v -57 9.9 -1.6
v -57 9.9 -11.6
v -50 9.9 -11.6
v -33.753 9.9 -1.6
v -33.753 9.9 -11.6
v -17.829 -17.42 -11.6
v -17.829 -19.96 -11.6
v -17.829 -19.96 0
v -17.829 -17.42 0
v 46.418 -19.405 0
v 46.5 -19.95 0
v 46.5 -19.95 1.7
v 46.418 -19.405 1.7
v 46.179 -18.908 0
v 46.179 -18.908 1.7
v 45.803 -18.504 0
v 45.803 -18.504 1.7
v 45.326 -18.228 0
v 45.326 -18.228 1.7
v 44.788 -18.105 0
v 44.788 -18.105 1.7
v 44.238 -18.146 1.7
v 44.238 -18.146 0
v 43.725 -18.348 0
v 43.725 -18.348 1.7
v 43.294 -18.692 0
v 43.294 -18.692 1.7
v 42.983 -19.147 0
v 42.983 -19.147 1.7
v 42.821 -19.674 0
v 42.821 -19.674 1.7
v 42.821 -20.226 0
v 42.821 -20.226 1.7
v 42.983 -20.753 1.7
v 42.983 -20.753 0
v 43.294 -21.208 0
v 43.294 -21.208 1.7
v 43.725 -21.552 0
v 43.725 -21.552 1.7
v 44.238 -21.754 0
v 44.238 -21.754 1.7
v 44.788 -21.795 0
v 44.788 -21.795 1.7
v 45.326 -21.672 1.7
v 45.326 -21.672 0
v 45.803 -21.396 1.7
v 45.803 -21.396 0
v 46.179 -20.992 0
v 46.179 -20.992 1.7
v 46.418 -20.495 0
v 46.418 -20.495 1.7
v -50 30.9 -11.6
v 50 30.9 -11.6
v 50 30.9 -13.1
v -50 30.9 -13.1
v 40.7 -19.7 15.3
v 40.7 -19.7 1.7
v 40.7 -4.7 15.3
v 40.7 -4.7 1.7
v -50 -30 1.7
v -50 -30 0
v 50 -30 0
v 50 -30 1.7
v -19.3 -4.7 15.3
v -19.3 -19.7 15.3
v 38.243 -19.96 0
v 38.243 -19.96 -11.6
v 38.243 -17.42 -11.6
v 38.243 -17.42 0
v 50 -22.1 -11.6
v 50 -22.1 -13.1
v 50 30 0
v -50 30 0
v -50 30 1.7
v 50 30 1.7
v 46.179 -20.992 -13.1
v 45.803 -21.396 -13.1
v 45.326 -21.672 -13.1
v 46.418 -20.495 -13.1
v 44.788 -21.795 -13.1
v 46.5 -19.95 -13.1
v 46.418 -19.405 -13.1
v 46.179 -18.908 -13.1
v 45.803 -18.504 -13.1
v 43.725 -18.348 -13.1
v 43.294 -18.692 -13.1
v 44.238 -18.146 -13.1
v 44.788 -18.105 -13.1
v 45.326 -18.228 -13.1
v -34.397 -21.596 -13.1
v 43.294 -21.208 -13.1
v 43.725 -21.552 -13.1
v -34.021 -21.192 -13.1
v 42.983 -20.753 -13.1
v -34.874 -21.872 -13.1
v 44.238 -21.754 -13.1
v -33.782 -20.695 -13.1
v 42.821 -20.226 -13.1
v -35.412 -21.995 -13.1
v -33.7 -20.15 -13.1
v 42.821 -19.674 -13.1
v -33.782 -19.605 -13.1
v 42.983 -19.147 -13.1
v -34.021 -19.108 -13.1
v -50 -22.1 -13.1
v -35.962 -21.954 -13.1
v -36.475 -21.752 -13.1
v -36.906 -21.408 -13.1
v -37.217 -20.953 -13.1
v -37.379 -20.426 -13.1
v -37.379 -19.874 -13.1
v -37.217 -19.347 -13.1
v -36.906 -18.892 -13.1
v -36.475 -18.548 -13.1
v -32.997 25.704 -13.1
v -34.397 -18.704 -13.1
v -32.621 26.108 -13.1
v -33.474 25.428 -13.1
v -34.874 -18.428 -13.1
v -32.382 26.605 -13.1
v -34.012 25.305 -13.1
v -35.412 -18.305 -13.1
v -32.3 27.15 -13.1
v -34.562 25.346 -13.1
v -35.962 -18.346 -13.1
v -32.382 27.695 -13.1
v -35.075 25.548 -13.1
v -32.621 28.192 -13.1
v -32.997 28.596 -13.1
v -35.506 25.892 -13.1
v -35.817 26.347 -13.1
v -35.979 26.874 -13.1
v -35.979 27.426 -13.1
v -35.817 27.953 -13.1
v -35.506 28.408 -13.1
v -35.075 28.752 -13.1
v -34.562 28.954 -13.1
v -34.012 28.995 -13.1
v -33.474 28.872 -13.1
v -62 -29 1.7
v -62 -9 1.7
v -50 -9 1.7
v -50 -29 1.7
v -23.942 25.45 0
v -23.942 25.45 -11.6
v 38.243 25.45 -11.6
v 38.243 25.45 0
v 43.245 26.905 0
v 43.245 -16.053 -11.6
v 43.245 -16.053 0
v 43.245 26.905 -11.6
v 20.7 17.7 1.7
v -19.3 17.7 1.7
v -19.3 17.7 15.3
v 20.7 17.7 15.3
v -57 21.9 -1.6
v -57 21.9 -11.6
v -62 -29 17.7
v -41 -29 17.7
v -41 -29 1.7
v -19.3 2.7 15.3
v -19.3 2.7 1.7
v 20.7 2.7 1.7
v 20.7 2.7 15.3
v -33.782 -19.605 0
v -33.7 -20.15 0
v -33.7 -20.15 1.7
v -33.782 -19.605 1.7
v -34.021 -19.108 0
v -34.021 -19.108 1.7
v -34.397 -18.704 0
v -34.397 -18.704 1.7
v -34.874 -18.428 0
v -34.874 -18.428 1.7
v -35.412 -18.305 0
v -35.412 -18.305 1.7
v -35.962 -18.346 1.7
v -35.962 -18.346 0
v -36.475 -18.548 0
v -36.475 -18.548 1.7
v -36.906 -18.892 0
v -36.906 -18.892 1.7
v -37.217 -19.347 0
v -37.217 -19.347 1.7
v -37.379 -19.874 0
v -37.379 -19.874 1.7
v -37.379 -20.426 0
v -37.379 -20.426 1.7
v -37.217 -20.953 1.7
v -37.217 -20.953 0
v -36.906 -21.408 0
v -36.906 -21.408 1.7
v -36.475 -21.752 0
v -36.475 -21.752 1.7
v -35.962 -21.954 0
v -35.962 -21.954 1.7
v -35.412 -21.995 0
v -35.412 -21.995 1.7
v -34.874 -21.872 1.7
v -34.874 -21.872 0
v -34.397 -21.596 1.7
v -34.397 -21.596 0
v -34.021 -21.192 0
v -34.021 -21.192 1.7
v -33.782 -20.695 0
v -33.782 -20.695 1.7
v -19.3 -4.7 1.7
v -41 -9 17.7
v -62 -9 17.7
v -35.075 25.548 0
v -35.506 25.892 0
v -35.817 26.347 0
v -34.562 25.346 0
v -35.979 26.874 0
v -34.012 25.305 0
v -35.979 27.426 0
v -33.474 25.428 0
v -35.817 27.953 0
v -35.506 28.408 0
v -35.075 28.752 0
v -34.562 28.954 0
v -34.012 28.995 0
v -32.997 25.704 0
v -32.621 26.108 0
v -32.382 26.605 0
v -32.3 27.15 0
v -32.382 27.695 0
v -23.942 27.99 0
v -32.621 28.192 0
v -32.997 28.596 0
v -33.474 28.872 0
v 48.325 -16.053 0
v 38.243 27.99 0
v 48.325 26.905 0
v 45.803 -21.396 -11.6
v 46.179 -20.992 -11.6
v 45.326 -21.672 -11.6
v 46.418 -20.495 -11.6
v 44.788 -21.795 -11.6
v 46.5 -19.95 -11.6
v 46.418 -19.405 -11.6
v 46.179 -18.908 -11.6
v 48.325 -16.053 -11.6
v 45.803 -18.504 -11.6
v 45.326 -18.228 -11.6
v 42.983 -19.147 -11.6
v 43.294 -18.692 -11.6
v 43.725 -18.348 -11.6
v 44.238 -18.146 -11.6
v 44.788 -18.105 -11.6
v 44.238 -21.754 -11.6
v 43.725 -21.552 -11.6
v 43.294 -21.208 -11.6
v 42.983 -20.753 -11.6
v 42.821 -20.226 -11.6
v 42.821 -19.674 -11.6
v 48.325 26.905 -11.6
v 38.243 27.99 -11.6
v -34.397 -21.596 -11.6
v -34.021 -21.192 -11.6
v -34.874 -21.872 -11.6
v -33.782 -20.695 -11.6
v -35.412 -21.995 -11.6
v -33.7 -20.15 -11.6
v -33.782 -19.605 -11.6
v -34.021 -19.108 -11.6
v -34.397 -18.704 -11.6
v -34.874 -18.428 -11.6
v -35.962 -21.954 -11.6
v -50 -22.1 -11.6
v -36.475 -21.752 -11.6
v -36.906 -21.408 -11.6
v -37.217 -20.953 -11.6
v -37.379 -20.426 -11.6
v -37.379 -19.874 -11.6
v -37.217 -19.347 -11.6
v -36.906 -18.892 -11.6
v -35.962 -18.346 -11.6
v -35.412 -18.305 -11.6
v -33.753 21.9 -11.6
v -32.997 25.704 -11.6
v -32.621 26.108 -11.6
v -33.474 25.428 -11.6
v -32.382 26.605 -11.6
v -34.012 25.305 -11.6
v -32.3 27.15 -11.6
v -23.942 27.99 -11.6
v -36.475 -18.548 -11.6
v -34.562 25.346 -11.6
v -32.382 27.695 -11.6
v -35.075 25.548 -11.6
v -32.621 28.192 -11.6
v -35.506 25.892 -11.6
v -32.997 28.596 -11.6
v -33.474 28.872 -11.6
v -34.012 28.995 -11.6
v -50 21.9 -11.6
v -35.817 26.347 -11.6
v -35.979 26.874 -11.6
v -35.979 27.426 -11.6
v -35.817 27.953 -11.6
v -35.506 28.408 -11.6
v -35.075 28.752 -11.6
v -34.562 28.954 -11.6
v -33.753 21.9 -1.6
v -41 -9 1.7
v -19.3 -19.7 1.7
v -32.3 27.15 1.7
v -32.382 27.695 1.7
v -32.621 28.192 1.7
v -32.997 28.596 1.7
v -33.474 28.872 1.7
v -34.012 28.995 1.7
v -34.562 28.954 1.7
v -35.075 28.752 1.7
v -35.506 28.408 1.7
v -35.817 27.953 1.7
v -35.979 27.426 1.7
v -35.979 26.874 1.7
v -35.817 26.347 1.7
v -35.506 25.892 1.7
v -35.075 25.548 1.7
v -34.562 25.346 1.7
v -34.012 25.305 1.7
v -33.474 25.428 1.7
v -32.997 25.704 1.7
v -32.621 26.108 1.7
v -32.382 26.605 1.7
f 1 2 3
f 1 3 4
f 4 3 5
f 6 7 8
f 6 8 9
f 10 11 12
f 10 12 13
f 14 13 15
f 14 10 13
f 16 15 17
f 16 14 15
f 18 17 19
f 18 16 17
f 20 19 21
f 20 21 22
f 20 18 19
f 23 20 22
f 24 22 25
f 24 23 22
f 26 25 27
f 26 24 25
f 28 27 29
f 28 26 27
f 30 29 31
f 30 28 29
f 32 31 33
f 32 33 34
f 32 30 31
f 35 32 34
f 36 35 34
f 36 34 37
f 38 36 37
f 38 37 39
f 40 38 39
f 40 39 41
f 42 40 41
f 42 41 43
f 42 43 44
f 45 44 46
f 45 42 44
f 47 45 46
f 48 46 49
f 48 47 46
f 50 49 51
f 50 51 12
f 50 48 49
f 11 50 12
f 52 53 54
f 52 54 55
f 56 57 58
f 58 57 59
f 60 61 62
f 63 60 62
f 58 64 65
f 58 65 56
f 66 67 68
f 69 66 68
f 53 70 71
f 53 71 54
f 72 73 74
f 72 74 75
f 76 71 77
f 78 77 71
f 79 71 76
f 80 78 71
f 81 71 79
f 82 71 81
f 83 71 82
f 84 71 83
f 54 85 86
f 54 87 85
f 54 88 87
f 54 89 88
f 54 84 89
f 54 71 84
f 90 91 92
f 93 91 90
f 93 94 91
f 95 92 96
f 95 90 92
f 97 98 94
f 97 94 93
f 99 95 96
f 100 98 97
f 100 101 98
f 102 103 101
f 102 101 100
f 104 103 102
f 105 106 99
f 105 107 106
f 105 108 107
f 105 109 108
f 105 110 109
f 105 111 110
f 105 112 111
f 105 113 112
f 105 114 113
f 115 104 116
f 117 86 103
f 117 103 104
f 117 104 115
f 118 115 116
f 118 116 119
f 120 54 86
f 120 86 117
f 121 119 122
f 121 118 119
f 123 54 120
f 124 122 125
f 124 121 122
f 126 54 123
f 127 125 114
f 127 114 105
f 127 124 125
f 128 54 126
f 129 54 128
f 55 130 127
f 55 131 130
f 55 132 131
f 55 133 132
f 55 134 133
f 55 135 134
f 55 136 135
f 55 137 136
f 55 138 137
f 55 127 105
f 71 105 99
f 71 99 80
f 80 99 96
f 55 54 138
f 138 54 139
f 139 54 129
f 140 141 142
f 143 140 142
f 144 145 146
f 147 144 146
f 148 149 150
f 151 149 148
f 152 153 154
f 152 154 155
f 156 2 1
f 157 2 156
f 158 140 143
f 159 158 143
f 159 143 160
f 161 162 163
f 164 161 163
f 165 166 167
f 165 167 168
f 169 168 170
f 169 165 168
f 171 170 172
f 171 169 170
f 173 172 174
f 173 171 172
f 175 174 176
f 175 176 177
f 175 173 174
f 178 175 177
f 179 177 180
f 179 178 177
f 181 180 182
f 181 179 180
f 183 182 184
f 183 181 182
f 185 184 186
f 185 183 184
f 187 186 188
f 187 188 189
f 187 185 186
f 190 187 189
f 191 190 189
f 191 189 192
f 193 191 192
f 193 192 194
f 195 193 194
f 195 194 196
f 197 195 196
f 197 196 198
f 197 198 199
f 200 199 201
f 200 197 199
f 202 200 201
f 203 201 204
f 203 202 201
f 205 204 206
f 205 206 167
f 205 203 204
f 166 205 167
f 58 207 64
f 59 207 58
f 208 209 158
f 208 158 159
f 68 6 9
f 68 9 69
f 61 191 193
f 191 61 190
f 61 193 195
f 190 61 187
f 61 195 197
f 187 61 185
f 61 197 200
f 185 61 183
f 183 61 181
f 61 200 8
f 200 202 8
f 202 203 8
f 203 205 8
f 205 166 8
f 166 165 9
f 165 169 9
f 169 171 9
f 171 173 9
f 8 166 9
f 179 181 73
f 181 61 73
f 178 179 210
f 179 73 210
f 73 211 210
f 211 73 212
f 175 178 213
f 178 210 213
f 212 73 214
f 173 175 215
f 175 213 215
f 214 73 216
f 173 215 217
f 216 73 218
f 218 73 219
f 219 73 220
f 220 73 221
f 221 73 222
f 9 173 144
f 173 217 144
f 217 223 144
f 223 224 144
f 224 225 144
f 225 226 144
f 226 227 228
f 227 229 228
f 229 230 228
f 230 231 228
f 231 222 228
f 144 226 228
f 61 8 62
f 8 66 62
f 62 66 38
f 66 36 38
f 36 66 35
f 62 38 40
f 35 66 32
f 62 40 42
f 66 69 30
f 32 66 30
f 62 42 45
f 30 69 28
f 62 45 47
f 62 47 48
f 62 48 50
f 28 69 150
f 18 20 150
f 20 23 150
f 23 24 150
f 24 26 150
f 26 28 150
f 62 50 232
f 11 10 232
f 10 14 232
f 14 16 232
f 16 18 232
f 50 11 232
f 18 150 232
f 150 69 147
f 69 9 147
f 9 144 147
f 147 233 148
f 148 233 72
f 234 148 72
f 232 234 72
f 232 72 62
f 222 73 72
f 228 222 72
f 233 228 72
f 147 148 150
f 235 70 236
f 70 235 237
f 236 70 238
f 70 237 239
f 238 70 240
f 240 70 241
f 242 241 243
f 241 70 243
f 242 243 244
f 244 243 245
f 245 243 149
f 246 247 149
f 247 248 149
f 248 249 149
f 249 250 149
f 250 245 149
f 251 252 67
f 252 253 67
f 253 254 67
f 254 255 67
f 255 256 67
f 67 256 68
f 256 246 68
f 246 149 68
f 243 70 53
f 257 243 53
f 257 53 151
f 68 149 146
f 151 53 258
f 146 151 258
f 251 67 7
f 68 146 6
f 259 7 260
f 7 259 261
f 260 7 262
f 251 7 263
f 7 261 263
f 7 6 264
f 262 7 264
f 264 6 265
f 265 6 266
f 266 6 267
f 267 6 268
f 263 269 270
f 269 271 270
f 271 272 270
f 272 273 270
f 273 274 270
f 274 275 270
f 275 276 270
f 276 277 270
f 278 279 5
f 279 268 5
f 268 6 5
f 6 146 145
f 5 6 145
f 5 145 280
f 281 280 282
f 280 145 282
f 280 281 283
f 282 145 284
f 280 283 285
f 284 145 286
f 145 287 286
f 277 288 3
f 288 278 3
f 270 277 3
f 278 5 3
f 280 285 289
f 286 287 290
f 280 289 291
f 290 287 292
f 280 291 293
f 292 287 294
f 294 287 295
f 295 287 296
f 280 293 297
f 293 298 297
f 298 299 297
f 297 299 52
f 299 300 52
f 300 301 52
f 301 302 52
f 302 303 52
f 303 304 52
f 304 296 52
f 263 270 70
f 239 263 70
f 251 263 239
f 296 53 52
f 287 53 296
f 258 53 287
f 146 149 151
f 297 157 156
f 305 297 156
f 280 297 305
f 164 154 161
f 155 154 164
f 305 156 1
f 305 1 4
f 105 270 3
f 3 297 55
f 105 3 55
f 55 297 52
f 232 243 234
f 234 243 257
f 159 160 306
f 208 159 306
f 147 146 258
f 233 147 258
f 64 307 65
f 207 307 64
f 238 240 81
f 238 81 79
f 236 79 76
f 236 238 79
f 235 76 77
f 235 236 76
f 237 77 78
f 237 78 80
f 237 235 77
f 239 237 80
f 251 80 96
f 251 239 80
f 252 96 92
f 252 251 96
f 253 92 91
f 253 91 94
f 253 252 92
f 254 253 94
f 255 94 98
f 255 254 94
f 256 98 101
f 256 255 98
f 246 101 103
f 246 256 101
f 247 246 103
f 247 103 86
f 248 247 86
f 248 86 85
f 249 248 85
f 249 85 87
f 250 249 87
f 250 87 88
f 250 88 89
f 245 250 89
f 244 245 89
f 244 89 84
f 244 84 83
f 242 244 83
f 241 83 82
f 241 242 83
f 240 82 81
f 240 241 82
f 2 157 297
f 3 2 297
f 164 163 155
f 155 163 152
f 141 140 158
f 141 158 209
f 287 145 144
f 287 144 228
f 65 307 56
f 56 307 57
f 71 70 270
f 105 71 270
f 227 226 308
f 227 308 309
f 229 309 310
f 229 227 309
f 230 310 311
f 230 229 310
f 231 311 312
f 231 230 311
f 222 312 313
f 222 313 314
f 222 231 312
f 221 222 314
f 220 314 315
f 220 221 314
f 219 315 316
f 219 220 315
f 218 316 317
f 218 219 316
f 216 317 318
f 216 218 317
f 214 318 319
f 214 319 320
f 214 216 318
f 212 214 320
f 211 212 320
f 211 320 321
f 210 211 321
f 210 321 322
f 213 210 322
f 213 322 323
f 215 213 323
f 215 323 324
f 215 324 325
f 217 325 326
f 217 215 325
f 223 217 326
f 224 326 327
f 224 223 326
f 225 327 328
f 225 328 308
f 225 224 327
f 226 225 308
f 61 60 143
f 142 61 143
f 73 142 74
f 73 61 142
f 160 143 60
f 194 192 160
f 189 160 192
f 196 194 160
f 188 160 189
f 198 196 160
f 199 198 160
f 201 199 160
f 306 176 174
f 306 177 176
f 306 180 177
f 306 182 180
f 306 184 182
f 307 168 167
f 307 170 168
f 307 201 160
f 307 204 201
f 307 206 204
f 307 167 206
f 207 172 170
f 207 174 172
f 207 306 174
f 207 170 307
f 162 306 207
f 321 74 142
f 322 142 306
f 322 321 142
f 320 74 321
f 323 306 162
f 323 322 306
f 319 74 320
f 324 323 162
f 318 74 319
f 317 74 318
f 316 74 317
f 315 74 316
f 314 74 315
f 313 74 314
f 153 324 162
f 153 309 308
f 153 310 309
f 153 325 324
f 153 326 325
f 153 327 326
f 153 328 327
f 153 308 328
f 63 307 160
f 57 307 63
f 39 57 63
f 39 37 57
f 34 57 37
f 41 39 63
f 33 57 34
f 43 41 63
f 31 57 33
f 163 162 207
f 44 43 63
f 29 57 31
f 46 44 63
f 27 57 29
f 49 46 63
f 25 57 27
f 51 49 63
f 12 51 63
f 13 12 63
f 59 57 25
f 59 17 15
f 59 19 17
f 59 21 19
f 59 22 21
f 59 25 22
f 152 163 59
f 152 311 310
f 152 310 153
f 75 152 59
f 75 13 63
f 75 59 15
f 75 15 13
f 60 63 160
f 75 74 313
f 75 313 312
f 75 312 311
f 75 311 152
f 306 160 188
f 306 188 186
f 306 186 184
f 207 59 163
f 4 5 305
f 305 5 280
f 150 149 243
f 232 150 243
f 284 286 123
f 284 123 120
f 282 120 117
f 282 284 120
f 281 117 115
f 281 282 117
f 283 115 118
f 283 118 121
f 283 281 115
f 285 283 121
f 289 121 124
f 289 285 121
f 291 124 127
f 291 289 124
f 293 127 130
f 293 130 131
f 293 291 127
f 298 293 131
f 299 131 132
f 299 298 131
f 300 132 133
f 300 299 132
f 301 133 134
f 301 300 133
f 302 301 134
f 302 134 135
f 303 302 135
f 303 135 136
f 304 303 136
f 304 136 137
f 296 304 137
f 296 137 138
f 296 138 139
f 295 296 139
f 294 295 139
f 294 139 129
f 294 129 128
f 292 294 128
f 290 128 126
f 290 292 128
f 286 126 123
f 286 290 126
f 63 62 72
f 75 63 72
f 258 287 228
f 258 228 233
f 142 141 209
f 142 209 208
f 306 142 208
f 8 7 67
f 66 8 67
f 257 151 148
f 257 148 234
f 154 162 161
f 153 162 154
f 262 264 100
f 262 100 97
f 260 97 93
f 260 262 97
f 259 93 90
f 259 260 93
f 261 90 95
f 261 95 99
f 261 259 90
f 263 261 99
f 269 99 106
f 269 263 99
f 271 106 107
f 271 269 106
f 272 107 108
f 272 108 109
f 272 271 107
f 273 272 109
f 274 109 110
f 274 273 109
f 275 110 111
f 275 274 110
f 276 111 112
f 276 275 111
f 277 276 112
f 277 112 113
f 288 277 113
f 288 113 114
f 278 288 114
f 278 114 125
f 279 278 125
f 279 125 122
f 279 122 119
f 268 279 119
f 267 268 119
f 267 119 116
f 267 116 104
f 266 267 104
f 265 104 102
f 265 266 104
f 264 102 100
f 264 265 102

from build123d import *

# Parameters (mm, degrees)
ESBO_O1_W                 = 100
ESBO_O1_H                 = 60
ESBO_O1_R                 = 1.85
RESSALTO_EXTRUS_O1_DEPTH  = 1.7
ESBO_O2_W                 = 60
ESBO_O2_H                 = 15
ESBO_O2_W_2               = 40
RESSALTO_EXTRUS_O2_DEPTH  = 13.6
RESSALTO_EXTRUS_O6_START  = 11.6
ESBO_O3_W                 = 100
ESBO_O3_H                 = 53
ESBO_O3_R                 = 1.85
RESSALTO_EXTRUS_O6_DEPTH  = 1.5
ESBO_O4_W                 = 62.184169383
ESBO_O4_H                 = 2.54
ESBO_O4_W_2               = 5.08
ESBO_O4_H_2               = 42.957805244
ESBO_O4_W_3               = 56.07185462
RESSALTO_EXTRUS_O8_DEPTH  = 11.6
ESBO_O6_W                 = 21
ESBO_O6_H                 = 20
RESSALTO_EXTRUS_O9_DEPTH  = 16
ESBO_O7_W                 = 23.246964405
ESBO_O7_H                 = 12
RESSALTO_EXTRUS_O10_DEPTH = 10


with BuildPart() as part:
    # Esboço1 → Ressalto-extrusão1 (new body)
    with BuildSketch(Plane.XY):
        Rectangle(ESBO_O1_W, ESBO_O1_H)
        with Locations((-34.15, 27.15)):
            Circle(ESBO_O1_R, mode=Mode.SUBTRACT)
        with Locations((-35.55, -20.15)):
            Circle(ESBO_O1_R, mode=Mode.SUBTRACT)
        with Locations((44.65, -19.95)):
            Circle(ESBO_O1_R, mode=Mode.SUBTRACT)
    extrude(amount=RESSALTO_EXTRUS_O1_DEPTH)

    # Esboço2 → Ressalto-extrusão2 (add)
    with BuildSketch(Plane.XY.offset(1.7)):
        with Locations((10.7, -12.2)):
            Rectangle(ESBO_O2_W, ESBO_O2_H)
        with Locations((0.7, 10.2)):
            Rectangle(ESBO_O2_W_2, ESBO_O2_H)
    extrude(amount=RESSALTO_EXTRUS_O2_DEPTH)



with BuildPart() as body_2:
    # Esboço3 → Ressalto-extrusão6 (new body)
    with BuildSketch(Plane(origin=(0, 0, 0), x_dir=(-1, 0, 0), z_dir=(0, 0, -1)).offset(RESSALTO_EXTRUS_O6_START)):
        with Locations((0, 4.4)):
            Rectangle(ESBO_O3_W, ESBO_O3_H)
        with Locations(Location((-44.65, -19.95, 0), (0, 0, 180))):
            Circle(ESBO_O3_R, mode=Mode.SUBTRACT)
        with Locations(Location((34.15, 27.15, 0), (0, 0, 180))):
            Circle(ESBO_O3_R, mode=Mode.SUBTRACT)
        with Locations(Location((35.55, -20.15, 0), (0, 0, 180))):
            Circle(ESBO_O3_R, mode=Mode.SUBTRACT)
    extrude(amount=RESSALTO_EXTRUS_O6_DEPTH)


with BuildPart() as part_1:
    add(part.part)

    add(body_2.part)  # Ressalto-extrusão8 merges body 2
    # Esboço4 → Ressalto-extrusão8 (add)
    with BuildSketch(Plane.XY.offset(-11.6)):
        with Locations((7.150543675, 26.719832293)):
            Rectangle(ESBO_O4_W, ESBO_O4_H)
        with Locations((45.784919315, 5.42627648)):
            Rectangle(ESBO_O4_W_2, ESBO_O4_H_2)
        with Locations((10.206701056, -18.689881399)):
            Rectangle(ESBO_O4_W_3, ESBO_O4_H)
    extrude(amount=RESSALTO_EXTRUS_O8_DEPTH)

    # Esboço6 → Ressalto-extrusão9 (add)
    with BuildSketch(Plane.XY.offset(1.7)):
        with Locations((-51.5, -19)):
            Rectangle(ESBO_O6_W, ESBO_O6_H)
    extrude(amount=RESSALTO_EXTRUS_O9_DEPTH)

    # Esboço7 → Ressalto-extrusão10 (add)
    with BuildSketch(Plane.XY.offset(-11.6)):
        with Locations((-45.376517798, 15.9)):
            Rectangle(ESBO_O7_W, ESBO_O7_H)
    extrude(amount=RESSALTO_EXTRUS_O10_DEPTH)


solid = part_1.part
